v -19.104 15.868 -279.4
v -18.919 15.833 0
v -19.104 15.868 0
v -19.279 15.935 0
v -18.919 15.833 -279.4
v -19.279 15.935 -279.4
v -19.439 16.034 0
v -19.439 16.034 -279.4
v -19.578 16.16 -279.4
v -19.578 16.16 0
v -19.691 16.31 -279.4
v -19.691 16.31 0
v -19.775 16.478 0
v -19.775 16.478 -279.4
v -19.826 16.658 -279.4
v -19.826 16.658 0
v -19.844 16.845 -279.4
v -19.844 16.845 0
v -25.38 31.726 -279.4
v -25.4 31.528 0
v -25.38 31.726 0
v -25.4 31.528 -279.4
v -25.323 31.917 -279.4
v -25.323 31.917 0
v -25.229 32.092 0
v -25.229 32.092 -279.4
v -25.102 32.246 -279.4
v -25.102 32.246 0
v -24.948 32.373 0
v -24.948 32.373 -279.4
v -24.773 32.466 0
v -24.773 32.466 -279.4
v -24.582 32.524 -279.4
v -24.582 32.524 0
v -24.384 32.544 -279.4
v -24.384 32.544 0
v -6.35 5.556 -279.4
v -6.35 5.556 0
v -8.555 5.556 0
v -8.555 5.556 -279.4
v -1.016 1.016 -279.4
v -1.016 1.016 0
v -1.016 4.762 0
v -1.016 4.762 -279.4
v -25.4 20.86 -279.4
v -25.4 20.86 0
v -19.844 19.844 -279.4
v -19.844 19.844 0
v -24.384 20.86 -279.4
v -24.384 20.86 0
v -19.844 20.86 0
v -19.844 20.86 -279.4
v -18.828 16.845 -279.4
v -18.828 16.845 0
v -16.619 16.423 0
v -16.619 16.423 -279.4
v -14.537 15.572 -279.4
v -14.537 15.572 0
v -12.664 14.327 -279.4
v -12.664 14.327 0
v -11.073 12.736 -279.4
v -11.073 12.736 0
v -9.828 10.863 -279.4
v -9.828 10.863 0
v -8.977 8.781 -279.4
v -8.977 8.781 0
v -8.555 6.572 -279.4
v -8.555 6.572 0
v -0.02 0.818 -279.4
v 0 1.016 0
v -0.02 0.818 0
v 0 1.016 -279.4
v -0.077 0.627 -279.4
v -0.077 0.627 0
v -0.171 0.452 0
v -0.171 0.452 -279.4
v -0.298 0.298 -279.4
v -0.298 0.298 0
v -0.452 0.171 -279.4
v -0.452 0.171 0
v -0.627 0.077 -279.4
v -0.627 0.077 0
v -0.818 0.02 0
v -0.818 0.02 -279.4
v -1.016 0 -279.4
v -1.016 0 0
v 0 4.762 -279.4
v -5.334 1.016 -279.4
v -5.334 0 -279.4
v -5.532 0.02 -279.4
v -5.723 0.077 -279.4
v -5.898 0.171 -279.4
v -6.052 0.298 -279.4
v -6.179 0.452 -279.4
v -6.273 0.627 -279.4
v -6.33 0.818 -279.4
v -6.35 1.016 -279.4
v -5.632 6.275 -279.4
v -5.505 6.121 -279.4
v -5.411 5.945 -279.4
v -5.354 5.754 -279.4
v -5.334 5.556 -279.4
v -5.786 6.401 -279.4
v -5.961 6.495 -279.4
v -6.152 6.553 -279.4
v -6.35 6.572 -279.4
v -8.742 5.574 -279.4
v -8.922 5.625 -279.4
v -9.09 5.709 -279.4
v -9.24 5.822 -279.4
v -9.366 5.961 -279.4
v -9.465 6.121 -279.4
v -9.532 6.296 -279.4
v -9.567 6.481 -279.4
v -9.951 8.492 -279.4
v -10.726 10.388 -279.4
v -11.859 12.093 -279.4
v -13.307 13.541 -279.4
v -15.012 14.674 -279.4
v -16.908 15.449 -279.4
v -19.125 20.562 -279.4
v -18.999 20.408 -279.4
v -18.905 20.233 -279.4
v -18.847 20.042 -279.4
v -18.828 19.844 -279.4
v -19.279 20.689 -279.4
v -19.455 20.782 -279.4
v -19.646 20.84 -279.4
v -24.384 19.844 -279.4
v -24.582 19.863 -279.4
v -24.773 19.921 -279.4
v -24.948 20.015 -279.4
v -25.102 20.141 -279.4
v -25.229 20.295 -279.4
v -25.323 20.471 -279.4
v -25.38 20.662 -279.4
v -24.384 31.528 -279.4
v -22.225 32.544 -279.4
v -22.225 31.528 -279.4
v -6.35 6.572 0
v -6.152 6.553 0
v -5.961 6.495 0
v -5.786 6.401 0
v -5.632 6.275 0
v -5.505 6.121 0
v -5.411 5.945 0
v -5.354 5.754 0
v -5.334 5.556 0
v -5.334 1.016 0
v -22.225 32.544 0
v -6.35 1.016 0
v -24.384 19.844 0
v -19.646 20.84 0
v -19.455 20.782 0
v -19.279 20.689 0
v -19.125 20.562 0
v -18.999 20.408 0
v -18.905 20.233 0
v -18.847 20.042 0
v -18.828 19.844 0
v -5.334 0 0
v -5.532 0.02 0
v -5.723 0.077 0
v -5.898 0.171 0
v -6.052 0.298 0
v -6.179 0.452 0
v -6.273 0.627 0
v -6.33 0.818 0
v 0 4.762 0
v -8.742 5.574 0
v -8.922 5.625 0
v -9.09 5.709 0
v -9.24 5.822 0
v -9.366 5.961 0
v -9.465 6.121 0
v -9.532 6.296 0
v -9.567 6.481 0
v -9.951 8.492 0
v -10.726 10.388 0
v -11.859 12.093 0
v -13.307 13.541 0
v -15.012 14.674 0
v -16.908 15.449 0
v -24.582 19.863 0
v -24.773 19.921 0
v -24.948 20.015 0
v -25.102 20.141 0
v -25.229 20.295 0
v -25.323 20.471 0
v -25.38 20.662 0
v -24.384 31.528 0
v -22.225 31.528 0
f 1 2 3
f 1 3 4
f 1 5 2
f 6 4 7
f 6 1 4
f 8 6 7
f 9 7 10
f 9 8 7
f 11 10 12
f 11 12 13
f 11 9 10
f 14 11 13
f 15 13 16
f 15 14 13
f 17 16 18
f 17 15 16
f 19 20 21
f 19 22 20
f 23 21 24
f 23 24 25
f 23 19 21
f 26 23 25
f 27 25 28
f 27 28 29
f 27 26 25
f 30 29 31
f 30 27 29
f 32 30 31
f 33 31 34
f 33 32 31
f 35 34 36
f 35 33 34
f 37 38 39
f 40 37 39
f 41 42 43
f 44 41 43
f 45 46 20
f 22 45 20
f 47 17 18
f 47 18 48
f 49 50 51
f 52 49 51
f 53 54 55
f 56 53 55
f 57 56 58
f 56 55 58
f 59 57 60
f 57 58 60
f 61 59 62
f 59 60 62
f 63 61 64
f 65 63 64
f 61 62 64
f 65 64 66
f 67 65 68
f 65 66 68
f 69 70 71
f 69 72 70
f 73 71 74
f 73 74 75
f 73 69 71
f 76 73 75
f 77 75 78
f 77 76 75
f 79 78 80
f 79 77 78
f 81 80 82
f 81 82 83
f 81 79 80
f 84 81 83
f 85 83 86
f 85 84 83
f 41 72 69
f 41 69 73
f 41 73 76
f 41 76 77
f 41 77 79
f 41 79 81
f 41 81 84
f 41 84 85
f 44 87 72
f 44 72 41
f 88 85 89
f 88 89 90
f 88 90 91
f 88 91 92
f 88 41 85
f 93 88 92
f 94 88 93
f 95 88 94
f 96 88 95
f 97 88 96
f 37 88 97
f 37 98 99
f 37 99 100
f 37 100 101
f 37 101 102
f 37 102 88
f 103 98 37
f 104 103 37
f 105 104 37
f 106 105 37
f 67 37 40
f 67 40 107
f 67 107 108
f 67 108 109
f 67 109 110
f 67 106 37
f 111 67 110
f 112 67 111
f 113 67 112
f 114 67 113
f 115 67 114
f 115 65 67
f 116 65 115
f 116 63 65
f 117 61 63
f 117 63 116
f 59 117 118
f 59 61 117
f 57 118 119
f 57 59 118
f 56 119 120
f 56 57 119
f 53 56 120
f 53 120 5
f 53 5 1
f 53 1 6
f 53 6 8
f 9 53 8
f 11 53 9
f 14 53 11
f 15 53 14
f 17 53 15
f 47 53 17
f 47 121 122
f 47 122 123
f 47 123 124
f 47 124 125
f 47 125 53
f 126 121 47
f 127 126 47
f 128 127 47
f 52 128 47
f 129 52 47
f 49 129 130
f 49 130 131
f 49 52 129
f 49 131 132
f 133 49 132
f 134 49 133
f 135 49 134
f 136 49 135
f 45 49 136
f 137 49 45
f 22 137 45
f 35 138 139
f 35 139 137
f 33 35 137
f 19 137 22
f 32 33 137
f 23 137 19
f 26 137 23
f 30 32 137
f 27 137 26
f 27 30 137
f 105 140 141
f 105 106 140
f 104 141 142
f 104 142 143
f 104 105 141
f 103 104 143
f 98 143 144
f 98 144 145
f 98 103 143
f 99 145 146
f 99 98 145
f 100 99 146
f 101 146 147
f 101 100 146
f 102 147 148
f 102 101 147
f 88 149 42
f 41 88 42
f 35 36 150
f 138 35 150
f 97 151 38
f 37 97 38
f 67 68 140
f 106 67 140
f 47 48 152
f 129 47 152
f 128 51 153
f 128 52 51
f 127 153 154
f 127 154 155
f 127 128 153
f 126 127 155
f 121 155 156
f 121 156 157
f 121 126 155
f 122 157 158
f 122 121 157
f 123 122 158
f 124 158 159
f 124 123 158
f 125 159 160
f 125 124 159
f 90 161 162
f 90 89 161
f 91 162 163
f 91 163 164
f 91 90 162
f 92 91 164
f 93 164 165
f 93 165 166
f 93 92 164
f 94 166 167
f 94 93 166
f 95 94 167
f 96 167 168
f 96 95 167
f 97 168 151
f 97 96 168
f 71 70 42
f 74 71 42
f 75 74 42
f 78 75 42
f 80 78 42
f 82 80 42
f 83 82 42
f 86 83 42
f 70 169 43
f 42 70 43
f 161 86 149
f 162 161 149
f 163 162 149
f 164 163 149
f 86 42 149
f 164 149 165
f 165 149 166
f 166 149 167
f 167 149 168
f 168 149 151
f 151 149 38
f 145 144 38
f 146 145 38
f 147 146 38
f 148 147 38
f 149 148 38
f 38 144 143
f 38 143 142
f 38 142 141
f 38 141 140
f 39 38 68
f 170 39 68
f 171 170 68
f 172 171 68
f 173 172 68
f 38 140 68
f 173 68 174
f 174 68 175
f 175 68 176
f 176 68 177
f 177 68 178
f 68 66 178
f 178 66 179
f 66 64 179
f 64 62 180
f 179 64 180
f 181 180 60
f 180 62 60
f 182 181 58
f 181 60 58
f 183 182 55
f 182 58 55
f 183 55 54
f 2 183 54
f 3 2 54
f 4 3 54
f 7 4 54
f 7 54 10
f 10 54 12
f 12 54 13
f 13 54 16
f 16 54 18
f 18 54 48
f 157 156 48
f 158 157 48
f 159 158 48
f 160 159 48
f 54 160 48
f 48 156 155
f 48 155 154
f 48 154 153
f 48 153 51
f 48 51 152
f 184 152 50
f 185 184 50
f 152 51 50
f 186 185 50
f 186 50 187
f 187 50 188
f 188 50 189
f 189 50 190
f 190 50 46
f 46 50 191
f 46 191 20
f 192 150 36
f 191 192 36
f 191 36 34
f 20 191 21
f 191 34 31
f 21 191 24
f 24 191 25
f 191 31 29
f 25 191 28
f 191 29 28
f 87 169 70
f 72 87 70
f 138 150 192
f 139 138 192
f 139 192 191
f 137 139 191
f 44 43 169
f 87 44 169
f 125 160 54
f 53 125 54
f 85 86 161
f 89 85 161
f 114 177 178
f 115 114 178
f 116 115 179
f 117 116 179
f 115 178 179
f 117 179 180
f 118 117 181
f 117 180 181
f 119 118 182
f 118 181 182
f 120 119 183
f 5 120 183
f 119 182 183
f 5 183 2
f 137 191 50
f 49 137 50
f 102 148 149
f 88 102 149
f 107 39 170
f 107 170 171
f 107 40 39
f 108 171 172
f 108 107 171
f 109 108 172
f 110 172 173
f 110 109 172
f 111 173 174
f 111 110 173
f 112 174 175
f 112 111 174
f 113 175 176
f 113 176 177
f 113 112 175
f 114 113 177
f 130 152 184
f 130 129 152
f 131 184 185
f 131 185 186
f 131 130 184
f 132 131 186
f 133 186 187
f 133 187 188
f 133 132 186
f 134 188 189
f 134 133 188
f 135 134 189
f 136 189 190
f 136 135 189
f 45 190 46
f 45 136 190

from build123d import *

# Parameters (mm, degrees)
EXTRUDE_THIN1_DEPTH = 279.4
FILLET1_R           = 1.016


with BuildPart() as part:
    # Sketch1 → Extrude-Thin1 (new body)
    with BuildSketch(Plane.XY):
        with BuildLine():
            Line((0, 4.7625), (0, 0))
            Line((0, 0), (-6.35, 0))
            Line((-6.35, 0), (-6.35, 5.55625))
            Line((-6.35, 5.55625), (-9.525, 5.55625))
            ThreePointArc((-9.525, 5.55625), (-12.547291902, 12.852708098), (-19.84375, 15.875))
            Line((-19.84375, 15.875), (-19.84375, 19.84375))
            Line((-19.84375, 19.84375), (-25.4, 19.84375))
            Line((-25.4, 19.84375), (-25.4, 32.54375))
            Line((-25.4, 32.54375), (-22.225, 32.54375))
            Line((-22.225, 32.54375), (-22.225, 31.52775))
            Line((-22.225, 31.52775), (-24.384, 31.52775))
            Line((-24.384, 31.52775), (-24.384, 20.85975))
            Line((-24.384, 20.85975), (-18.82775, 20.85975))
            Line((-18.82775, 20.85975), (-18.82775, 16.845373153))
            ThreePointArc((-18.82775, 16.845373153), (-11.828871412, 13.571128588), (-8.554626847, 6.57225))
            Line((-8.554626847, 6.57225), (-5.334, 6.57225))
            Line((-5.334, 6.57225), (-5.334, 1.016))
            Line((-5.334, 1.016), (-1.016, 1.016))
            Line((-1.016, 1.016), (-1.016, 4.7625))
            Line((-1.016, 4.7625), (0, 4.7625))
        make_face()
    extrude(amount=-EXTRUDE_THIN1_DEPTH)

    # Fillet1
    fillet1_edges = [part.edges().sort_by_distance(p)[0] for p in [
        (-18.82775, 20.85975, -139.7),
        (-5.334, 6.57225, -139.7),
        (0, 0, -139.7),
        (-6.35, 0, -139.7),
        (-9.525, 5.55625, -139.7),
        (-19.84375, 15.875, -139.7),
        (-25.4, 19.84375, -139.7),
        (-25.4, 32.54375, -139.7),
    ]]
    fillet(fillet1_edges, radius=FILLET1_R)


solid = part.part
